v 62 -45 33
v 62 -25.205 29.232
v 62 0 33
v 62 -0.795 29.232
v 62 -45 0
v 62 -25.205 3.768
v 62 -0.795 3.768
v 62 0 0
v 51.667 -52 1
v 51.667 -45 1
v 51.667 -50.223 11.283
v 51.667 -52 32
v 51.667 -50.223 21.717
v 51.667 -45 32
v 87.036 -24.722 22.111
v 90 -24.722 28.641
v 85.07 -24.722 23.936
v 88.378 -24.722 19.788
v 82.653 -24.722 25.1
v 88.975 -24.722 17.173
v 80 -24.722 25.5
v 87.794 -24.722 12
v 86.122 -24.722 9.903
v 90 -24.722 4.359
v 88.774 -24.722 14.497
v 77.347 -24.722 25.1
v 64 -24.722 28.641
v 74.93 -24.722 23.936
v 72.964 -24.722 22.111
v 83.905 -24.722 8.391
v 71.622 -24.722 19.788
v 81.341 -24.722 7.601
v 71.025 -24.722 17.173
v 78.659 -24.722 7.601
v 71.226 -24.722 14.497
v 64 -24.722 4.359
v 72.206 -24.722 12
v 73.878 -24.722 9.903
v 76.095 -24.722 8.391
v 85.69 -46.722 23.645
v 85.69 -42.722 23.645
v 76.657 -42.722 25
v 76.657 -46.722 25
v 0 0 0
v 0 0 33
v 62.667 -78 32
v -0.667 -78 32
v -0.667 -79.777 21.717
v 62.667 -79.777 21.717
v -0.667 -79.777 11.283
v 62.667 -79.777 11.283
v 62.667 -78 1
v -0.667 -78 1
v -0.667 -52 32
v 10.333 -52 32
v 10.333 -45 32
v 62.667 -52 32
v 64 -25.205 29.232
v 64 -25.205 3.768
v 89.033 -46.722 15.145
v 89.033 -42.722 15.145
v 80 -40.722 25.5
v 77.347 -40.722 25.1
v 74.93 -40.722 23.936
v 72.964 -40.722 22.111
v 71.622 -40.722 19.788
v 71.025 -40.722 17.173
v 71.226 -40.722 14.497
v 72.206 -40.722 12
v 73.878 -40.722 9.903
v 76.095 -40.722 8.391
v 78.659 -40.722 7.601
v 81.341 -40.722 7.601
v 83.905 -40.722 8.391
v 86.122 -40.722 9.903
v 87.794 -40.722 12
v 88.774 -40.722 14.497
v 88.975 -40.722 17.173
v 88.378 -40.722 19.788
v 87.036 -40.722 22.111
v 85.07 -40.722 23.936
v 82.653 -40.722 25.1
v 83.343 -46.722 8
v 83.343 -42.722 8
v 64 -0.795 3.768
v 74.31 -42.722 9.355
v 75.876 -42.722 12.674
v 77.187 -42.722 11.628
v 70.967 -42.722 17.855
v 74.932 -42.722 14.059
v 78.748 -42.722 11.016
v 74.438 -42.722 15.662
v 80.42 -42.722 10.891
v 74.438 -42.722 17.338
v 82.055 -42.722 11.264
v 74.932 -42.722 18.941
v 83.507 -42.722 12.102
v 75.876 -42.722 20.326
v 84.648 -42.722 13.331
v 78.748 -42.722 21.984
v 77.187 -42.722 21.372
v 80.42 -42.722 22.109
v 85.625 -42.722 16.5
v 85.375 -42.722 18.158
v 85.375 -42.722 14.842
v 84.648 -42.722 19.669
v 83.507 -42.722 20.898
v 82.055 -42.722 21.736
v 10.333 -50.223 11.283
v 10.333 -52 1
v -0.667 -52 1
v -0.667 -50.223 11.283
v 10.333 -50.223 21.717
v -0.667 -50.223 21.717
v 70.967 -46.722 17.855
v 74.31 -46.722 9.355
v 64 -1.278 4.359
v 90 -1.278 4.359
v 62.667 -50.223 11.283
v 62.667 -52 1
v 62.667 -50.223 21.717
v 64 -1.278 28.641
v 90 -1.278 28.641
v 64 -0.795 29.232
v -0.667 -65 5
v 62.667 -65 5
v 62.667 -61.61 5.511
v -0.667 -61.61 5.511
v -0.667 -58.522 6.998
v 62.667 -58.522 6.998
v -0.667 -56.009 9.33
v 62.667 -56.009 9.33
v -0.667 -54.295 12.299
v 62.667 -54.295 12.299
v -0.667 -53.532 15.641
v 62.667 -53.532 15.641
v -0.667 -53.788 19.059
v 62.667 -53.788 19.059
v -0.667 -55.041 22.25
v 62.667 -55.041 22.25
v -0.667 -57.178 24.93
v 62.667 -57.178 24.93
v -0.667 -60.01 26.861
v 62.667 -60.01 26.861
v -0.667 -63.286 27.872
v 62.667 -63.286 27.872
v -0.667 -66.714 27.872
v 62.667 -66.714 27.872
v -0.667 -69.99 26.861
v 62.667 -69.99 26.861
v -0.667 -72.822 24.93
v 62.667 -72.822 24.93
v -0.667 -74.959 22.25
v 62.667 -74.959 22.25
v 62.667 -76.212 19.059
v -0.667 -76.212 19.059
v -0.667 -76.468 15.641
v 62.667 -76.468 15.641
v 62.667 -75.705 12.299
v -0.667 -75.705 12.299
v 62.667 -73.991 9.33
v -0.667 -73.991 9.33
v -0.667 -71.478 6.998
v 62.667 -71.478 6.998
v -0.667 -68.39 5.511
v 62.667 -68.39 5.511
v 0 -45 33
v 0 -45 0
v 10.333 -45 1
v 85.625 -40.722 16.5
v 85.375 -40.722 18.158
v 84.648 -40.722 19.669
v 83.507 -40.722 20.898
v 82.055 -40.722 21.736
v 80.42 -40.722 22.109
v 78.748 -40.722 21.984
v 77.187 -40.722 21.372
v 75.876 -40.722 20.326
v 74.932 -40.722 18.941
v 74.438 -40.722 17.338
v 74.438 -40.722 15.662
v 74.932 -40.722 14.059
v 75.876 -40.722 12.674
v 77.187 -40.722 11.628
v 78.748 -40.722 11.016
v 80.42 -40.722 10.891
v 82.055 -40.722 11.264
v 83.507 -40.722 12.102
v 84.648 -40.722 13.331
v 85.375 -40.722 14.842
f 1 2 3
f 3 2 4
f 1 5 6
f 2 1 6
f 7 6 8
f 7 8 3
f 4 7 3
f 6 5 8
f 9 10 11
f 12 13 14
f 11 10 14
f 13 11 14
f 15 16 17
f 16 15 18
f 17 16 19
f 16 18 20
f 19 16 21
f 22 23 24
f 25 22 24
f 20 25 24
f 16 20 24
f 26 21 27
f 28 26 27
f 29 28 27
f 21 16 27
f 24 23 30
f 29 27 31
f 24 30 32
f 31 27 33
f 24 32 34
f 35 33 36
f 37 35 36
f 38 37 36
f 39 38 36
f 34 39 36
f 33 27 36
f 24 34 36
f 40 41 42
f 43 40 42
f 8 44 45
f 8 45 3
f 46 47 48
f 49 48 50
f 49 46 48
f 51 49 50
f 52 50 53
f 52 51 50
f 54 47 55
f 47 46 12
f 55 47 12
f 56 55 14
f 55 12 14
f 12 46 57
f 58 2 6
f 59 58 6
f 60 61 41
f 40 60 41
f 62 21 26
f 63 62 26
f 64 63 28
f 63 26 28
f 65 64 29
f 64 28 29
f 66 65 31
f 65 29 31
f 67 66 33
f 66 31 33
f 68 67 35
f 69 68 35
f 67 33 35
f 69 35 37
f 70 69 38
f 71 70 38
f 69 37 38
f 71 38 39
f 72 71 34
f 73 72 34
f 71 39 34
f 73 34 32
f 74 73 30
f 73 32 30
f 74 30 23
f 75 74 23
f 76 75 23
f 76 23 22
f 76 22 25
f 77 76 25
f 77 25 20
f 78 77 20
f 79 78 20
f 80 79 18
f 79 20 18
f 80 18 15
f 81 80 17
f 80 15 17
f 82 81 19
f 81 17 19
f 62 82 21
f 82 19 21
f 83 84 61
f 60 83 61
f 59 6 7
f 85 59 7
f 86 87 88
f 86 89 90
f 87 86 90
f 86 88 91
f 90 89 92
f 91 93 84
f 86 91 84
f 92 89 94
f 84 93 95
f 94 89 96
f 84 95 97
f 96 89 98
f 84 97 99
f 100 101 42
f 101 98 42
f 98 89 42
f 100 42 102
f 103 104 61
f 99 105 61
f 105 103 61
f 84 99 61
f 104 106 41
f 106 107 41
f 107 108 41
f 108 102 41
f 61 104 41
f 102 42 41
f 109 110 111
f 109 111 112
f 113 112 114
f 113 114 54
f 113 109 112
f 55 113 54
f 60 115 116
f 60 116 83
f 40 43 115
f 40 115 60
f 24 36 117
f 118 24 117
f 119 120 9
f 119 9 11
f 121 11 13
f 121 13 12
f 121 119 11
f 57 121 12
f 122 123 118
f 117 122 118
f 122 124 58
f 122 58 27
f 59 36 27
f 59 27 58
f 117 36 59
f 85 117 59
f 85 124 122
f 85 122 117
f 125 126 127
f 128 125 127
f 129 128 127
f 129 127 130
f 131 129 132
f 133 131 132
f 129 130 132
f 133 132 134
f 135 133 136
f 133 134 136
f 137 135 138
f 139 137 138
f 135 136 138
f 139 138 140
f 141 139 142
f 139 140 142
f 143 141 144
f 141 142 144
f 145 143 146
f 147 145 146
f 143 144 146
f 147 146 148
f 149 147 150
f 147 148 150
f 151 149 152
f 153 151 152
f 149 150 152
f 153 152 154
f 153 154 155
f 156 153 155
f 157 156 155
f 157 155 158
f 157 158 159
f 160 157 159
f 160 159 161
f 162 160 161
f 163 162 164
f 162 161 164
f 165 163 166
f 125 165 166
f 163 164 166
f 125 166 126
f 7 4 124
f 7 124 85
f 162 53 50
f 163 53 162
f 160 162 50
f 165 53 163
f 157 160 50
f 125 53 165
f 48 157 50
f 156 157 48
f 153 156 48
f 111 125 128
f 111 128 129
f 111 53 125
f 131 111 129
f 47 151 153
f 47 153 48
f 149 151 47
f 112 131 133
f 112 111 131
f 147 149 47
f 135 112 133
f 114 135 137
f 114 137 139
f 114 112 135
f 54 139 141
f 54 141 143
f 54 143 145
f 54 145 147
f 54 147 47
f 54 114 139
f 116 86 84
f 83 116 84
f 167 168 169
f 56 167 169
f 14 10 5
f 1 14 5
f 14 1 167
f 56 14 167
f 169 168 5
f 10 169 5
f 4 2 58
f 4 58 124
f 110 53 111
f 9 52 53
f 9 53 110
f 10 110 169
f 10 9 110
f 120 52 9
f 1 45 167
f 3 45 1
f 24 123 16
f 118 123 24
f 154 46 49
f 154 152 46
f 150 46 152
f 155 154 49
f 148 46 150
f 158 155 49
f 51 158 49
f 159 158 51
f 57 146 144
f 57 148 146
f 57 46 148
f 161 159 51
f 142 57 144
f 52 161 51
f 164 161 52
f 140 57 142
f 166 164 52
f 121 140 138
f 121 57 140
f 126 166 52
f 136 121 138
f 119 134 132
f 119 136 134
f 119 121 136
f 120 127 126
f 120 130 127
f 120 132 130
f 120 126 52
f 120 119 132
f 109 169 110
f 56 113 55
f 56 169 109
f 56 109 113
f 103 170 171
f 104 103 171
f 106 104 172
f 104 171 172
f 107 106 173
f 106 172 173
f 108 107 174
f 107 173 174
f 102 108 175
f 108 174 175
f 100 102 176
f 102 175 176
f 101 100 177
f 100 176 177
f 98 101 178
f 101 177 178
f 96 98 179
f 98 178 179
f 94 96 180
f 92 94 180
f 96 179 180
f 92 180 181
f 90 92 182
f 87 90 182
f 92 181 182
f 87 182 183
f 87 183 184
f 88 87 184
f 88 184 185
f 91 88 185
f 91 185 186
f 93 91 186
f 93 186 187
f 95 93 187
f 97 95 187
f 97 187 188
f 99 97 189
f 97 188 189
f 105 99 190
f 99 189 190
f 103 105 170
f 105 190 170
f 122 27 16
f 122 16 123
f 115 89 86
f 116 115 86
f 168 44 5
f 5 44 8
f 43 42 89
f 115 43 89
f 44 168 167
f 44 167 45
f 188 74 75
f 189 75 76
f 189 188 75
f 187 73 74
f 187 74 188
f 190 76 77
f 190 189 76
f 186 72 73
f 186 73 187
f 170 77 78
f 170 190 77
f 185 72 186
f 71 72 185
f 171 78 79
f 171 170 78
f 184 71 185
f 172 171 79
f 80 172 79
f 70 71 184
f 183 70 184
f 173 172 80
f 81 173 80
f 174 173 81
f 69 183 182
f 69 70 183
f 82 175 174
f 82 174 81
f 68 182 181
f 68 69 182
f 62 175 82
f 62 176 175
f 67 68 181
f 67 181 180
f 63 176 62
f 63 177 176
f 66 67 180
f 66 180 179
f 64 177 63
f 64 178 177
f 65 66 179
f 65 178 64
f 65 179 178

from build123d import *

# Parameters (mm, degrees)
CROQUIS1_W               = 62
CROQUIS1_H               = 45
SALIENTE_EXTRUIR1_DEPTH  = 33
CROQUIS2_W               = 25.463929144
CROQUIS2_H               = 24.410779192
SALIENTE_EXTRUIR2_DEPTH  = 2
CROQUIS3_W               = 24.282059014
CROQUIS3_H               = 23.443794542
SALIENTE_EXTRUIR3_DEPTH  = 26
CROQUIS5_W               = 41.33364391
CROQUIS5_H               = 31
SALIENTE_EXTRUIR5_DEPTH  = 35
CROQUIS6_W               = 31
CROQUIS6_H               = 30
SALIENTE_EXTRUIR6_DEPTH  = 11
CROQUIS7_W               = 31
CROQUIS7_H               = 30
SALIENTE_EXTRUIR7_DEPTH  = 11
CORTAR_EXTRUIR1_DEPTH    = 11
CORTAR_EXTRUIR2_DEPTH    = 52.33364391
CORTAR_EXTRUIR3_START    = -11
CORTAR_EXTRUIR3_DEPTH    = 11
CROQUIS17_R              = 9
SALIENTE_EXTRUIR8_DEPTH  = 16
CROQUIS18_R              = 5.625205596
SALIENTE_EXTRUIR9_DEPTH  = 2
SALIENTE_EXTRUIR10_DEPTH = 4
CROQUIS20_R              = 11.5
CORTAR_EXTRUIR6_DEPTH    = 63.33364391


with BuildPart() as part:
    # Croquis1 → Saliente-Extruir1 (new body)
    with BuildSketch(Plane.XY):
        with Locations((31, -22.5)):
            Rectangle(CROQUIS1_W, CROQUIS1_H)
    extrude(amount=SALIENTE_EXTRUIR1_DEPTH)

    # Croquis2 → Saliente-Extruir2 (add)
    with BuildSketch(Plane(origin=(62, 0, 0), x_dir=(0, 0, -1), z_dir=(1, 0, 0))):
        with Locations((-16.5, -13)):
            Rectangle(CROQUIS2_W, CROQUIS2_H)
    extrude(amount=SALIENTE_EXTRUIR2_DEPTH)

    # Croquis3 → Saliente-Extruir3 (add)
    with BuildSketch(Plane(origin=(64, 0, 0), x_dir=(0, 0, -1), z_dir=(1, 0, 0))):
        with Locations((-16.5, -13)):
            Rectangle(CROQUIS3_W, CROQUIS3_H)
    extrude(amount=SALIENTE_EXTRUIR3_DEPTH)

    # Croquis5 → Saliente-Extruir5 (add)
    with BuildSketch(Plane.XZ.offset(45)):
        with Locations((31, 16.5)):
            Rectangle(CROQUIS5_W, CROQUIS5_H)
    extrude(amount=SALIENTE_EXTRUIR5_DEPTH)

    # Croquis6 → Saliente-Extruir6 (add)
    with BuildSketch(Plane(origin=(51.666821955, 0, 0), x_dir=(0, 0, -1), z_dir=(1, 0, 0))):
        with Locations((-16.5, -65)):
            Rectangle(CROQUIS6_W, CROQUIS6_H)
    extrude(amount=SALIENTE_EXTRUIR6_DEPTH)

    # Croquis7 → Saliente-Extruir7 (add)
    with BuildSketch(Plane.ZY.offset(-10.333178045)):
        with Locations((16.5, -65)):
            Rectangle(CROQUIS7_W, CROQUIS7_H)
    extrude(amount=SALIENTE_EXTRUIR7_DEPTH)

    # Croquis8 → Cortar-Extruir1 (cut)
    with BuildSketch(Plane(origin=(62.666821955, 0, 0), x_dir=(0, 0, -1), z_dir=(1, 0, 0))):
        with BuildLine():
            Line((-32, -80), (-32, -78))
            ThreePointArc((-32, -78), (-16.5, -80), (-1, -78))
            Line((-1, -78), (0.928970142, -80.475031326))
            Line((0.928970142, -80.475031326), (-0.274135128, -81.99339903))
            Line((-0.274135128, -81.99339903), (-8.695872018, -84.279445288))
            Line((-8.695872018, -84.279445288), (-24.986567701, -83.98679806))
            Line((-24.986567701, -83.98679806), (-32, -80))
        make_face()
        with BuildLine():
            Line((-32, -52), (-33.723093641, -49.93126323))
            Line((-33.723093641, -49.93126323), (-34.225322301, -47.788491738))
            Line((-34.225322301, -47.788491738), (-30.90530883, -47.311645213))
            Line((-30.90530883, -47.311645213), (-17.951536569, -46.72536261))
            Line((-17.951536569, -46.72536261), (-10.133210988, -47.311645213))
            Line((-10.133210988, -47.311645213), (0, -48.071517035))
            Line((0, -48.071517035), (0, -49))
            Line((0, -49), (-1, -52))
            ThreePointArc((-1, -52), (-16.5, -50), (-32, -52))
        make_face()
    extrude(amount=-CORTAR_EXTRUIR1_DEPTH, mode=Mode.SUBTRACT)

    # Croquis9 → Cortar-Extruir2 (cut)
    with BuildSketch(Plane(origin=(51.666821955, 0, 0), x_dir=(0, 0, -1), z_dir=(1, 0, 0))):
        with BuildLine():
            Line((-32, -78), (-33.497607454, -80))
            Line((-33.497607454, -80), (-33.497607454, -82.886987671))
            Line((-33.497607454, -82.886987671), (-32, -84.384595125))
            Line((-32, -84.384595125), (-22.575228316, -85.712467989))
            Line((-22.575228316, -85.712467989), (-14.351815451, -85.712467989))
            Line((-14.351815451, -85.712467989), (-8.532169423, -85.048531557))
            Line((-8.532169423, -85.048531557), (-1, -84.384595125))
            Line((-1, -84.384595125), (0.769167017, -82.615428108))
            Line((0.769167017, -82.615428108), (1.462440059, -80.483220833))
            Line((1.462440059, -80.483220833), (1.462440059, -79))
            Line((1.462440059, -79), (-1, -78))
            ThreePointArc((-1, -78), (-16.5, -80), (-32, -78))
        make_face()
    extrude(amount=-CORTAR_EXTRUIR2_DEPTH, mode=Mode.SUBTRACT)

    # Croquis10 → Cortar-Extruir3 (cut)
    with BuildSketch(Plane.ZY.offset(0.666821955).offset(CORTAR_EXTRUIR3_START)):
        with BuildLine():
            Line((32, -52), (34.151499122, -49.263012271))
            Line((34.151499122, -49.263012271), (33.075749561, -47.196000203))
            Line((33.075749561, -47.196000203), (22.583484216, -46.688313029))
            Line((22.583484216, -46.688313029), (7.099025391, -47.631160639))
            Line((7.099025391, -47.631160639), (-1.096496141, -48.229506237))
            Line((-1.096496141, -48.229506237), (1, -52))
            ThreePointArc((1, -52), (16.5, -50), (32, -52))
        make_face()
    extrude(amount=CORTAR_EXTRUIR3_DEPTH, mode=Mode.SUBTRACT)

    # Croquis17 → Saliente-Extruir8 (add)
    with BuildSketch(Plane.XZ.offset(24.721897271)):
        with Locations(Location((80, 16.5, 0), (0, 0, 90))):
            Circle(CROQUIS17_R)
    extrude(amount=SALIENTE_EXTRUIR8_DEPTH)

    # Croquis18 → Saliente-Extruir9 (add)
    with BuildSketch(Plane.XZ.offset(40.721897271)):
        with Locations((80, 16.5)):
            Circle(CROQUIS18_R)
    extrude(amount=SALIENTE_EXTRUIR9_DEPTH)

    # Croquis19 → Saliente-Extruir10 (add)
    with BuildSketch(Plane.XZ.offset(42.721897271)):
        Polygon((89.032919524, 15.145062071), (85.689870429, 23.645268814), (76.656950905, 25.000206743), (70.967080476, 17.854937929), (74.310129571, 9.354731186), (83.343049095, 7.999793257), align=None)
    extrude(amount=SALIENTE_EXTRUIR10_DEPTH)

    # Croquis20 → Cortar-Extruir6 (cut)
    with BuildSketch(Plane(origin=(62.666821955, 0, 0), x_dir=(0, 0, -1), z_dir=(1, 0, 0))):
        with Locations((-16.5, -65)):
            Circle(CROQUIS20_R)
    extrude(amount=-CORTAR_EXTRUIR6_DEPTH, mode=Mode.SUBTRACT)


solid = part.part
